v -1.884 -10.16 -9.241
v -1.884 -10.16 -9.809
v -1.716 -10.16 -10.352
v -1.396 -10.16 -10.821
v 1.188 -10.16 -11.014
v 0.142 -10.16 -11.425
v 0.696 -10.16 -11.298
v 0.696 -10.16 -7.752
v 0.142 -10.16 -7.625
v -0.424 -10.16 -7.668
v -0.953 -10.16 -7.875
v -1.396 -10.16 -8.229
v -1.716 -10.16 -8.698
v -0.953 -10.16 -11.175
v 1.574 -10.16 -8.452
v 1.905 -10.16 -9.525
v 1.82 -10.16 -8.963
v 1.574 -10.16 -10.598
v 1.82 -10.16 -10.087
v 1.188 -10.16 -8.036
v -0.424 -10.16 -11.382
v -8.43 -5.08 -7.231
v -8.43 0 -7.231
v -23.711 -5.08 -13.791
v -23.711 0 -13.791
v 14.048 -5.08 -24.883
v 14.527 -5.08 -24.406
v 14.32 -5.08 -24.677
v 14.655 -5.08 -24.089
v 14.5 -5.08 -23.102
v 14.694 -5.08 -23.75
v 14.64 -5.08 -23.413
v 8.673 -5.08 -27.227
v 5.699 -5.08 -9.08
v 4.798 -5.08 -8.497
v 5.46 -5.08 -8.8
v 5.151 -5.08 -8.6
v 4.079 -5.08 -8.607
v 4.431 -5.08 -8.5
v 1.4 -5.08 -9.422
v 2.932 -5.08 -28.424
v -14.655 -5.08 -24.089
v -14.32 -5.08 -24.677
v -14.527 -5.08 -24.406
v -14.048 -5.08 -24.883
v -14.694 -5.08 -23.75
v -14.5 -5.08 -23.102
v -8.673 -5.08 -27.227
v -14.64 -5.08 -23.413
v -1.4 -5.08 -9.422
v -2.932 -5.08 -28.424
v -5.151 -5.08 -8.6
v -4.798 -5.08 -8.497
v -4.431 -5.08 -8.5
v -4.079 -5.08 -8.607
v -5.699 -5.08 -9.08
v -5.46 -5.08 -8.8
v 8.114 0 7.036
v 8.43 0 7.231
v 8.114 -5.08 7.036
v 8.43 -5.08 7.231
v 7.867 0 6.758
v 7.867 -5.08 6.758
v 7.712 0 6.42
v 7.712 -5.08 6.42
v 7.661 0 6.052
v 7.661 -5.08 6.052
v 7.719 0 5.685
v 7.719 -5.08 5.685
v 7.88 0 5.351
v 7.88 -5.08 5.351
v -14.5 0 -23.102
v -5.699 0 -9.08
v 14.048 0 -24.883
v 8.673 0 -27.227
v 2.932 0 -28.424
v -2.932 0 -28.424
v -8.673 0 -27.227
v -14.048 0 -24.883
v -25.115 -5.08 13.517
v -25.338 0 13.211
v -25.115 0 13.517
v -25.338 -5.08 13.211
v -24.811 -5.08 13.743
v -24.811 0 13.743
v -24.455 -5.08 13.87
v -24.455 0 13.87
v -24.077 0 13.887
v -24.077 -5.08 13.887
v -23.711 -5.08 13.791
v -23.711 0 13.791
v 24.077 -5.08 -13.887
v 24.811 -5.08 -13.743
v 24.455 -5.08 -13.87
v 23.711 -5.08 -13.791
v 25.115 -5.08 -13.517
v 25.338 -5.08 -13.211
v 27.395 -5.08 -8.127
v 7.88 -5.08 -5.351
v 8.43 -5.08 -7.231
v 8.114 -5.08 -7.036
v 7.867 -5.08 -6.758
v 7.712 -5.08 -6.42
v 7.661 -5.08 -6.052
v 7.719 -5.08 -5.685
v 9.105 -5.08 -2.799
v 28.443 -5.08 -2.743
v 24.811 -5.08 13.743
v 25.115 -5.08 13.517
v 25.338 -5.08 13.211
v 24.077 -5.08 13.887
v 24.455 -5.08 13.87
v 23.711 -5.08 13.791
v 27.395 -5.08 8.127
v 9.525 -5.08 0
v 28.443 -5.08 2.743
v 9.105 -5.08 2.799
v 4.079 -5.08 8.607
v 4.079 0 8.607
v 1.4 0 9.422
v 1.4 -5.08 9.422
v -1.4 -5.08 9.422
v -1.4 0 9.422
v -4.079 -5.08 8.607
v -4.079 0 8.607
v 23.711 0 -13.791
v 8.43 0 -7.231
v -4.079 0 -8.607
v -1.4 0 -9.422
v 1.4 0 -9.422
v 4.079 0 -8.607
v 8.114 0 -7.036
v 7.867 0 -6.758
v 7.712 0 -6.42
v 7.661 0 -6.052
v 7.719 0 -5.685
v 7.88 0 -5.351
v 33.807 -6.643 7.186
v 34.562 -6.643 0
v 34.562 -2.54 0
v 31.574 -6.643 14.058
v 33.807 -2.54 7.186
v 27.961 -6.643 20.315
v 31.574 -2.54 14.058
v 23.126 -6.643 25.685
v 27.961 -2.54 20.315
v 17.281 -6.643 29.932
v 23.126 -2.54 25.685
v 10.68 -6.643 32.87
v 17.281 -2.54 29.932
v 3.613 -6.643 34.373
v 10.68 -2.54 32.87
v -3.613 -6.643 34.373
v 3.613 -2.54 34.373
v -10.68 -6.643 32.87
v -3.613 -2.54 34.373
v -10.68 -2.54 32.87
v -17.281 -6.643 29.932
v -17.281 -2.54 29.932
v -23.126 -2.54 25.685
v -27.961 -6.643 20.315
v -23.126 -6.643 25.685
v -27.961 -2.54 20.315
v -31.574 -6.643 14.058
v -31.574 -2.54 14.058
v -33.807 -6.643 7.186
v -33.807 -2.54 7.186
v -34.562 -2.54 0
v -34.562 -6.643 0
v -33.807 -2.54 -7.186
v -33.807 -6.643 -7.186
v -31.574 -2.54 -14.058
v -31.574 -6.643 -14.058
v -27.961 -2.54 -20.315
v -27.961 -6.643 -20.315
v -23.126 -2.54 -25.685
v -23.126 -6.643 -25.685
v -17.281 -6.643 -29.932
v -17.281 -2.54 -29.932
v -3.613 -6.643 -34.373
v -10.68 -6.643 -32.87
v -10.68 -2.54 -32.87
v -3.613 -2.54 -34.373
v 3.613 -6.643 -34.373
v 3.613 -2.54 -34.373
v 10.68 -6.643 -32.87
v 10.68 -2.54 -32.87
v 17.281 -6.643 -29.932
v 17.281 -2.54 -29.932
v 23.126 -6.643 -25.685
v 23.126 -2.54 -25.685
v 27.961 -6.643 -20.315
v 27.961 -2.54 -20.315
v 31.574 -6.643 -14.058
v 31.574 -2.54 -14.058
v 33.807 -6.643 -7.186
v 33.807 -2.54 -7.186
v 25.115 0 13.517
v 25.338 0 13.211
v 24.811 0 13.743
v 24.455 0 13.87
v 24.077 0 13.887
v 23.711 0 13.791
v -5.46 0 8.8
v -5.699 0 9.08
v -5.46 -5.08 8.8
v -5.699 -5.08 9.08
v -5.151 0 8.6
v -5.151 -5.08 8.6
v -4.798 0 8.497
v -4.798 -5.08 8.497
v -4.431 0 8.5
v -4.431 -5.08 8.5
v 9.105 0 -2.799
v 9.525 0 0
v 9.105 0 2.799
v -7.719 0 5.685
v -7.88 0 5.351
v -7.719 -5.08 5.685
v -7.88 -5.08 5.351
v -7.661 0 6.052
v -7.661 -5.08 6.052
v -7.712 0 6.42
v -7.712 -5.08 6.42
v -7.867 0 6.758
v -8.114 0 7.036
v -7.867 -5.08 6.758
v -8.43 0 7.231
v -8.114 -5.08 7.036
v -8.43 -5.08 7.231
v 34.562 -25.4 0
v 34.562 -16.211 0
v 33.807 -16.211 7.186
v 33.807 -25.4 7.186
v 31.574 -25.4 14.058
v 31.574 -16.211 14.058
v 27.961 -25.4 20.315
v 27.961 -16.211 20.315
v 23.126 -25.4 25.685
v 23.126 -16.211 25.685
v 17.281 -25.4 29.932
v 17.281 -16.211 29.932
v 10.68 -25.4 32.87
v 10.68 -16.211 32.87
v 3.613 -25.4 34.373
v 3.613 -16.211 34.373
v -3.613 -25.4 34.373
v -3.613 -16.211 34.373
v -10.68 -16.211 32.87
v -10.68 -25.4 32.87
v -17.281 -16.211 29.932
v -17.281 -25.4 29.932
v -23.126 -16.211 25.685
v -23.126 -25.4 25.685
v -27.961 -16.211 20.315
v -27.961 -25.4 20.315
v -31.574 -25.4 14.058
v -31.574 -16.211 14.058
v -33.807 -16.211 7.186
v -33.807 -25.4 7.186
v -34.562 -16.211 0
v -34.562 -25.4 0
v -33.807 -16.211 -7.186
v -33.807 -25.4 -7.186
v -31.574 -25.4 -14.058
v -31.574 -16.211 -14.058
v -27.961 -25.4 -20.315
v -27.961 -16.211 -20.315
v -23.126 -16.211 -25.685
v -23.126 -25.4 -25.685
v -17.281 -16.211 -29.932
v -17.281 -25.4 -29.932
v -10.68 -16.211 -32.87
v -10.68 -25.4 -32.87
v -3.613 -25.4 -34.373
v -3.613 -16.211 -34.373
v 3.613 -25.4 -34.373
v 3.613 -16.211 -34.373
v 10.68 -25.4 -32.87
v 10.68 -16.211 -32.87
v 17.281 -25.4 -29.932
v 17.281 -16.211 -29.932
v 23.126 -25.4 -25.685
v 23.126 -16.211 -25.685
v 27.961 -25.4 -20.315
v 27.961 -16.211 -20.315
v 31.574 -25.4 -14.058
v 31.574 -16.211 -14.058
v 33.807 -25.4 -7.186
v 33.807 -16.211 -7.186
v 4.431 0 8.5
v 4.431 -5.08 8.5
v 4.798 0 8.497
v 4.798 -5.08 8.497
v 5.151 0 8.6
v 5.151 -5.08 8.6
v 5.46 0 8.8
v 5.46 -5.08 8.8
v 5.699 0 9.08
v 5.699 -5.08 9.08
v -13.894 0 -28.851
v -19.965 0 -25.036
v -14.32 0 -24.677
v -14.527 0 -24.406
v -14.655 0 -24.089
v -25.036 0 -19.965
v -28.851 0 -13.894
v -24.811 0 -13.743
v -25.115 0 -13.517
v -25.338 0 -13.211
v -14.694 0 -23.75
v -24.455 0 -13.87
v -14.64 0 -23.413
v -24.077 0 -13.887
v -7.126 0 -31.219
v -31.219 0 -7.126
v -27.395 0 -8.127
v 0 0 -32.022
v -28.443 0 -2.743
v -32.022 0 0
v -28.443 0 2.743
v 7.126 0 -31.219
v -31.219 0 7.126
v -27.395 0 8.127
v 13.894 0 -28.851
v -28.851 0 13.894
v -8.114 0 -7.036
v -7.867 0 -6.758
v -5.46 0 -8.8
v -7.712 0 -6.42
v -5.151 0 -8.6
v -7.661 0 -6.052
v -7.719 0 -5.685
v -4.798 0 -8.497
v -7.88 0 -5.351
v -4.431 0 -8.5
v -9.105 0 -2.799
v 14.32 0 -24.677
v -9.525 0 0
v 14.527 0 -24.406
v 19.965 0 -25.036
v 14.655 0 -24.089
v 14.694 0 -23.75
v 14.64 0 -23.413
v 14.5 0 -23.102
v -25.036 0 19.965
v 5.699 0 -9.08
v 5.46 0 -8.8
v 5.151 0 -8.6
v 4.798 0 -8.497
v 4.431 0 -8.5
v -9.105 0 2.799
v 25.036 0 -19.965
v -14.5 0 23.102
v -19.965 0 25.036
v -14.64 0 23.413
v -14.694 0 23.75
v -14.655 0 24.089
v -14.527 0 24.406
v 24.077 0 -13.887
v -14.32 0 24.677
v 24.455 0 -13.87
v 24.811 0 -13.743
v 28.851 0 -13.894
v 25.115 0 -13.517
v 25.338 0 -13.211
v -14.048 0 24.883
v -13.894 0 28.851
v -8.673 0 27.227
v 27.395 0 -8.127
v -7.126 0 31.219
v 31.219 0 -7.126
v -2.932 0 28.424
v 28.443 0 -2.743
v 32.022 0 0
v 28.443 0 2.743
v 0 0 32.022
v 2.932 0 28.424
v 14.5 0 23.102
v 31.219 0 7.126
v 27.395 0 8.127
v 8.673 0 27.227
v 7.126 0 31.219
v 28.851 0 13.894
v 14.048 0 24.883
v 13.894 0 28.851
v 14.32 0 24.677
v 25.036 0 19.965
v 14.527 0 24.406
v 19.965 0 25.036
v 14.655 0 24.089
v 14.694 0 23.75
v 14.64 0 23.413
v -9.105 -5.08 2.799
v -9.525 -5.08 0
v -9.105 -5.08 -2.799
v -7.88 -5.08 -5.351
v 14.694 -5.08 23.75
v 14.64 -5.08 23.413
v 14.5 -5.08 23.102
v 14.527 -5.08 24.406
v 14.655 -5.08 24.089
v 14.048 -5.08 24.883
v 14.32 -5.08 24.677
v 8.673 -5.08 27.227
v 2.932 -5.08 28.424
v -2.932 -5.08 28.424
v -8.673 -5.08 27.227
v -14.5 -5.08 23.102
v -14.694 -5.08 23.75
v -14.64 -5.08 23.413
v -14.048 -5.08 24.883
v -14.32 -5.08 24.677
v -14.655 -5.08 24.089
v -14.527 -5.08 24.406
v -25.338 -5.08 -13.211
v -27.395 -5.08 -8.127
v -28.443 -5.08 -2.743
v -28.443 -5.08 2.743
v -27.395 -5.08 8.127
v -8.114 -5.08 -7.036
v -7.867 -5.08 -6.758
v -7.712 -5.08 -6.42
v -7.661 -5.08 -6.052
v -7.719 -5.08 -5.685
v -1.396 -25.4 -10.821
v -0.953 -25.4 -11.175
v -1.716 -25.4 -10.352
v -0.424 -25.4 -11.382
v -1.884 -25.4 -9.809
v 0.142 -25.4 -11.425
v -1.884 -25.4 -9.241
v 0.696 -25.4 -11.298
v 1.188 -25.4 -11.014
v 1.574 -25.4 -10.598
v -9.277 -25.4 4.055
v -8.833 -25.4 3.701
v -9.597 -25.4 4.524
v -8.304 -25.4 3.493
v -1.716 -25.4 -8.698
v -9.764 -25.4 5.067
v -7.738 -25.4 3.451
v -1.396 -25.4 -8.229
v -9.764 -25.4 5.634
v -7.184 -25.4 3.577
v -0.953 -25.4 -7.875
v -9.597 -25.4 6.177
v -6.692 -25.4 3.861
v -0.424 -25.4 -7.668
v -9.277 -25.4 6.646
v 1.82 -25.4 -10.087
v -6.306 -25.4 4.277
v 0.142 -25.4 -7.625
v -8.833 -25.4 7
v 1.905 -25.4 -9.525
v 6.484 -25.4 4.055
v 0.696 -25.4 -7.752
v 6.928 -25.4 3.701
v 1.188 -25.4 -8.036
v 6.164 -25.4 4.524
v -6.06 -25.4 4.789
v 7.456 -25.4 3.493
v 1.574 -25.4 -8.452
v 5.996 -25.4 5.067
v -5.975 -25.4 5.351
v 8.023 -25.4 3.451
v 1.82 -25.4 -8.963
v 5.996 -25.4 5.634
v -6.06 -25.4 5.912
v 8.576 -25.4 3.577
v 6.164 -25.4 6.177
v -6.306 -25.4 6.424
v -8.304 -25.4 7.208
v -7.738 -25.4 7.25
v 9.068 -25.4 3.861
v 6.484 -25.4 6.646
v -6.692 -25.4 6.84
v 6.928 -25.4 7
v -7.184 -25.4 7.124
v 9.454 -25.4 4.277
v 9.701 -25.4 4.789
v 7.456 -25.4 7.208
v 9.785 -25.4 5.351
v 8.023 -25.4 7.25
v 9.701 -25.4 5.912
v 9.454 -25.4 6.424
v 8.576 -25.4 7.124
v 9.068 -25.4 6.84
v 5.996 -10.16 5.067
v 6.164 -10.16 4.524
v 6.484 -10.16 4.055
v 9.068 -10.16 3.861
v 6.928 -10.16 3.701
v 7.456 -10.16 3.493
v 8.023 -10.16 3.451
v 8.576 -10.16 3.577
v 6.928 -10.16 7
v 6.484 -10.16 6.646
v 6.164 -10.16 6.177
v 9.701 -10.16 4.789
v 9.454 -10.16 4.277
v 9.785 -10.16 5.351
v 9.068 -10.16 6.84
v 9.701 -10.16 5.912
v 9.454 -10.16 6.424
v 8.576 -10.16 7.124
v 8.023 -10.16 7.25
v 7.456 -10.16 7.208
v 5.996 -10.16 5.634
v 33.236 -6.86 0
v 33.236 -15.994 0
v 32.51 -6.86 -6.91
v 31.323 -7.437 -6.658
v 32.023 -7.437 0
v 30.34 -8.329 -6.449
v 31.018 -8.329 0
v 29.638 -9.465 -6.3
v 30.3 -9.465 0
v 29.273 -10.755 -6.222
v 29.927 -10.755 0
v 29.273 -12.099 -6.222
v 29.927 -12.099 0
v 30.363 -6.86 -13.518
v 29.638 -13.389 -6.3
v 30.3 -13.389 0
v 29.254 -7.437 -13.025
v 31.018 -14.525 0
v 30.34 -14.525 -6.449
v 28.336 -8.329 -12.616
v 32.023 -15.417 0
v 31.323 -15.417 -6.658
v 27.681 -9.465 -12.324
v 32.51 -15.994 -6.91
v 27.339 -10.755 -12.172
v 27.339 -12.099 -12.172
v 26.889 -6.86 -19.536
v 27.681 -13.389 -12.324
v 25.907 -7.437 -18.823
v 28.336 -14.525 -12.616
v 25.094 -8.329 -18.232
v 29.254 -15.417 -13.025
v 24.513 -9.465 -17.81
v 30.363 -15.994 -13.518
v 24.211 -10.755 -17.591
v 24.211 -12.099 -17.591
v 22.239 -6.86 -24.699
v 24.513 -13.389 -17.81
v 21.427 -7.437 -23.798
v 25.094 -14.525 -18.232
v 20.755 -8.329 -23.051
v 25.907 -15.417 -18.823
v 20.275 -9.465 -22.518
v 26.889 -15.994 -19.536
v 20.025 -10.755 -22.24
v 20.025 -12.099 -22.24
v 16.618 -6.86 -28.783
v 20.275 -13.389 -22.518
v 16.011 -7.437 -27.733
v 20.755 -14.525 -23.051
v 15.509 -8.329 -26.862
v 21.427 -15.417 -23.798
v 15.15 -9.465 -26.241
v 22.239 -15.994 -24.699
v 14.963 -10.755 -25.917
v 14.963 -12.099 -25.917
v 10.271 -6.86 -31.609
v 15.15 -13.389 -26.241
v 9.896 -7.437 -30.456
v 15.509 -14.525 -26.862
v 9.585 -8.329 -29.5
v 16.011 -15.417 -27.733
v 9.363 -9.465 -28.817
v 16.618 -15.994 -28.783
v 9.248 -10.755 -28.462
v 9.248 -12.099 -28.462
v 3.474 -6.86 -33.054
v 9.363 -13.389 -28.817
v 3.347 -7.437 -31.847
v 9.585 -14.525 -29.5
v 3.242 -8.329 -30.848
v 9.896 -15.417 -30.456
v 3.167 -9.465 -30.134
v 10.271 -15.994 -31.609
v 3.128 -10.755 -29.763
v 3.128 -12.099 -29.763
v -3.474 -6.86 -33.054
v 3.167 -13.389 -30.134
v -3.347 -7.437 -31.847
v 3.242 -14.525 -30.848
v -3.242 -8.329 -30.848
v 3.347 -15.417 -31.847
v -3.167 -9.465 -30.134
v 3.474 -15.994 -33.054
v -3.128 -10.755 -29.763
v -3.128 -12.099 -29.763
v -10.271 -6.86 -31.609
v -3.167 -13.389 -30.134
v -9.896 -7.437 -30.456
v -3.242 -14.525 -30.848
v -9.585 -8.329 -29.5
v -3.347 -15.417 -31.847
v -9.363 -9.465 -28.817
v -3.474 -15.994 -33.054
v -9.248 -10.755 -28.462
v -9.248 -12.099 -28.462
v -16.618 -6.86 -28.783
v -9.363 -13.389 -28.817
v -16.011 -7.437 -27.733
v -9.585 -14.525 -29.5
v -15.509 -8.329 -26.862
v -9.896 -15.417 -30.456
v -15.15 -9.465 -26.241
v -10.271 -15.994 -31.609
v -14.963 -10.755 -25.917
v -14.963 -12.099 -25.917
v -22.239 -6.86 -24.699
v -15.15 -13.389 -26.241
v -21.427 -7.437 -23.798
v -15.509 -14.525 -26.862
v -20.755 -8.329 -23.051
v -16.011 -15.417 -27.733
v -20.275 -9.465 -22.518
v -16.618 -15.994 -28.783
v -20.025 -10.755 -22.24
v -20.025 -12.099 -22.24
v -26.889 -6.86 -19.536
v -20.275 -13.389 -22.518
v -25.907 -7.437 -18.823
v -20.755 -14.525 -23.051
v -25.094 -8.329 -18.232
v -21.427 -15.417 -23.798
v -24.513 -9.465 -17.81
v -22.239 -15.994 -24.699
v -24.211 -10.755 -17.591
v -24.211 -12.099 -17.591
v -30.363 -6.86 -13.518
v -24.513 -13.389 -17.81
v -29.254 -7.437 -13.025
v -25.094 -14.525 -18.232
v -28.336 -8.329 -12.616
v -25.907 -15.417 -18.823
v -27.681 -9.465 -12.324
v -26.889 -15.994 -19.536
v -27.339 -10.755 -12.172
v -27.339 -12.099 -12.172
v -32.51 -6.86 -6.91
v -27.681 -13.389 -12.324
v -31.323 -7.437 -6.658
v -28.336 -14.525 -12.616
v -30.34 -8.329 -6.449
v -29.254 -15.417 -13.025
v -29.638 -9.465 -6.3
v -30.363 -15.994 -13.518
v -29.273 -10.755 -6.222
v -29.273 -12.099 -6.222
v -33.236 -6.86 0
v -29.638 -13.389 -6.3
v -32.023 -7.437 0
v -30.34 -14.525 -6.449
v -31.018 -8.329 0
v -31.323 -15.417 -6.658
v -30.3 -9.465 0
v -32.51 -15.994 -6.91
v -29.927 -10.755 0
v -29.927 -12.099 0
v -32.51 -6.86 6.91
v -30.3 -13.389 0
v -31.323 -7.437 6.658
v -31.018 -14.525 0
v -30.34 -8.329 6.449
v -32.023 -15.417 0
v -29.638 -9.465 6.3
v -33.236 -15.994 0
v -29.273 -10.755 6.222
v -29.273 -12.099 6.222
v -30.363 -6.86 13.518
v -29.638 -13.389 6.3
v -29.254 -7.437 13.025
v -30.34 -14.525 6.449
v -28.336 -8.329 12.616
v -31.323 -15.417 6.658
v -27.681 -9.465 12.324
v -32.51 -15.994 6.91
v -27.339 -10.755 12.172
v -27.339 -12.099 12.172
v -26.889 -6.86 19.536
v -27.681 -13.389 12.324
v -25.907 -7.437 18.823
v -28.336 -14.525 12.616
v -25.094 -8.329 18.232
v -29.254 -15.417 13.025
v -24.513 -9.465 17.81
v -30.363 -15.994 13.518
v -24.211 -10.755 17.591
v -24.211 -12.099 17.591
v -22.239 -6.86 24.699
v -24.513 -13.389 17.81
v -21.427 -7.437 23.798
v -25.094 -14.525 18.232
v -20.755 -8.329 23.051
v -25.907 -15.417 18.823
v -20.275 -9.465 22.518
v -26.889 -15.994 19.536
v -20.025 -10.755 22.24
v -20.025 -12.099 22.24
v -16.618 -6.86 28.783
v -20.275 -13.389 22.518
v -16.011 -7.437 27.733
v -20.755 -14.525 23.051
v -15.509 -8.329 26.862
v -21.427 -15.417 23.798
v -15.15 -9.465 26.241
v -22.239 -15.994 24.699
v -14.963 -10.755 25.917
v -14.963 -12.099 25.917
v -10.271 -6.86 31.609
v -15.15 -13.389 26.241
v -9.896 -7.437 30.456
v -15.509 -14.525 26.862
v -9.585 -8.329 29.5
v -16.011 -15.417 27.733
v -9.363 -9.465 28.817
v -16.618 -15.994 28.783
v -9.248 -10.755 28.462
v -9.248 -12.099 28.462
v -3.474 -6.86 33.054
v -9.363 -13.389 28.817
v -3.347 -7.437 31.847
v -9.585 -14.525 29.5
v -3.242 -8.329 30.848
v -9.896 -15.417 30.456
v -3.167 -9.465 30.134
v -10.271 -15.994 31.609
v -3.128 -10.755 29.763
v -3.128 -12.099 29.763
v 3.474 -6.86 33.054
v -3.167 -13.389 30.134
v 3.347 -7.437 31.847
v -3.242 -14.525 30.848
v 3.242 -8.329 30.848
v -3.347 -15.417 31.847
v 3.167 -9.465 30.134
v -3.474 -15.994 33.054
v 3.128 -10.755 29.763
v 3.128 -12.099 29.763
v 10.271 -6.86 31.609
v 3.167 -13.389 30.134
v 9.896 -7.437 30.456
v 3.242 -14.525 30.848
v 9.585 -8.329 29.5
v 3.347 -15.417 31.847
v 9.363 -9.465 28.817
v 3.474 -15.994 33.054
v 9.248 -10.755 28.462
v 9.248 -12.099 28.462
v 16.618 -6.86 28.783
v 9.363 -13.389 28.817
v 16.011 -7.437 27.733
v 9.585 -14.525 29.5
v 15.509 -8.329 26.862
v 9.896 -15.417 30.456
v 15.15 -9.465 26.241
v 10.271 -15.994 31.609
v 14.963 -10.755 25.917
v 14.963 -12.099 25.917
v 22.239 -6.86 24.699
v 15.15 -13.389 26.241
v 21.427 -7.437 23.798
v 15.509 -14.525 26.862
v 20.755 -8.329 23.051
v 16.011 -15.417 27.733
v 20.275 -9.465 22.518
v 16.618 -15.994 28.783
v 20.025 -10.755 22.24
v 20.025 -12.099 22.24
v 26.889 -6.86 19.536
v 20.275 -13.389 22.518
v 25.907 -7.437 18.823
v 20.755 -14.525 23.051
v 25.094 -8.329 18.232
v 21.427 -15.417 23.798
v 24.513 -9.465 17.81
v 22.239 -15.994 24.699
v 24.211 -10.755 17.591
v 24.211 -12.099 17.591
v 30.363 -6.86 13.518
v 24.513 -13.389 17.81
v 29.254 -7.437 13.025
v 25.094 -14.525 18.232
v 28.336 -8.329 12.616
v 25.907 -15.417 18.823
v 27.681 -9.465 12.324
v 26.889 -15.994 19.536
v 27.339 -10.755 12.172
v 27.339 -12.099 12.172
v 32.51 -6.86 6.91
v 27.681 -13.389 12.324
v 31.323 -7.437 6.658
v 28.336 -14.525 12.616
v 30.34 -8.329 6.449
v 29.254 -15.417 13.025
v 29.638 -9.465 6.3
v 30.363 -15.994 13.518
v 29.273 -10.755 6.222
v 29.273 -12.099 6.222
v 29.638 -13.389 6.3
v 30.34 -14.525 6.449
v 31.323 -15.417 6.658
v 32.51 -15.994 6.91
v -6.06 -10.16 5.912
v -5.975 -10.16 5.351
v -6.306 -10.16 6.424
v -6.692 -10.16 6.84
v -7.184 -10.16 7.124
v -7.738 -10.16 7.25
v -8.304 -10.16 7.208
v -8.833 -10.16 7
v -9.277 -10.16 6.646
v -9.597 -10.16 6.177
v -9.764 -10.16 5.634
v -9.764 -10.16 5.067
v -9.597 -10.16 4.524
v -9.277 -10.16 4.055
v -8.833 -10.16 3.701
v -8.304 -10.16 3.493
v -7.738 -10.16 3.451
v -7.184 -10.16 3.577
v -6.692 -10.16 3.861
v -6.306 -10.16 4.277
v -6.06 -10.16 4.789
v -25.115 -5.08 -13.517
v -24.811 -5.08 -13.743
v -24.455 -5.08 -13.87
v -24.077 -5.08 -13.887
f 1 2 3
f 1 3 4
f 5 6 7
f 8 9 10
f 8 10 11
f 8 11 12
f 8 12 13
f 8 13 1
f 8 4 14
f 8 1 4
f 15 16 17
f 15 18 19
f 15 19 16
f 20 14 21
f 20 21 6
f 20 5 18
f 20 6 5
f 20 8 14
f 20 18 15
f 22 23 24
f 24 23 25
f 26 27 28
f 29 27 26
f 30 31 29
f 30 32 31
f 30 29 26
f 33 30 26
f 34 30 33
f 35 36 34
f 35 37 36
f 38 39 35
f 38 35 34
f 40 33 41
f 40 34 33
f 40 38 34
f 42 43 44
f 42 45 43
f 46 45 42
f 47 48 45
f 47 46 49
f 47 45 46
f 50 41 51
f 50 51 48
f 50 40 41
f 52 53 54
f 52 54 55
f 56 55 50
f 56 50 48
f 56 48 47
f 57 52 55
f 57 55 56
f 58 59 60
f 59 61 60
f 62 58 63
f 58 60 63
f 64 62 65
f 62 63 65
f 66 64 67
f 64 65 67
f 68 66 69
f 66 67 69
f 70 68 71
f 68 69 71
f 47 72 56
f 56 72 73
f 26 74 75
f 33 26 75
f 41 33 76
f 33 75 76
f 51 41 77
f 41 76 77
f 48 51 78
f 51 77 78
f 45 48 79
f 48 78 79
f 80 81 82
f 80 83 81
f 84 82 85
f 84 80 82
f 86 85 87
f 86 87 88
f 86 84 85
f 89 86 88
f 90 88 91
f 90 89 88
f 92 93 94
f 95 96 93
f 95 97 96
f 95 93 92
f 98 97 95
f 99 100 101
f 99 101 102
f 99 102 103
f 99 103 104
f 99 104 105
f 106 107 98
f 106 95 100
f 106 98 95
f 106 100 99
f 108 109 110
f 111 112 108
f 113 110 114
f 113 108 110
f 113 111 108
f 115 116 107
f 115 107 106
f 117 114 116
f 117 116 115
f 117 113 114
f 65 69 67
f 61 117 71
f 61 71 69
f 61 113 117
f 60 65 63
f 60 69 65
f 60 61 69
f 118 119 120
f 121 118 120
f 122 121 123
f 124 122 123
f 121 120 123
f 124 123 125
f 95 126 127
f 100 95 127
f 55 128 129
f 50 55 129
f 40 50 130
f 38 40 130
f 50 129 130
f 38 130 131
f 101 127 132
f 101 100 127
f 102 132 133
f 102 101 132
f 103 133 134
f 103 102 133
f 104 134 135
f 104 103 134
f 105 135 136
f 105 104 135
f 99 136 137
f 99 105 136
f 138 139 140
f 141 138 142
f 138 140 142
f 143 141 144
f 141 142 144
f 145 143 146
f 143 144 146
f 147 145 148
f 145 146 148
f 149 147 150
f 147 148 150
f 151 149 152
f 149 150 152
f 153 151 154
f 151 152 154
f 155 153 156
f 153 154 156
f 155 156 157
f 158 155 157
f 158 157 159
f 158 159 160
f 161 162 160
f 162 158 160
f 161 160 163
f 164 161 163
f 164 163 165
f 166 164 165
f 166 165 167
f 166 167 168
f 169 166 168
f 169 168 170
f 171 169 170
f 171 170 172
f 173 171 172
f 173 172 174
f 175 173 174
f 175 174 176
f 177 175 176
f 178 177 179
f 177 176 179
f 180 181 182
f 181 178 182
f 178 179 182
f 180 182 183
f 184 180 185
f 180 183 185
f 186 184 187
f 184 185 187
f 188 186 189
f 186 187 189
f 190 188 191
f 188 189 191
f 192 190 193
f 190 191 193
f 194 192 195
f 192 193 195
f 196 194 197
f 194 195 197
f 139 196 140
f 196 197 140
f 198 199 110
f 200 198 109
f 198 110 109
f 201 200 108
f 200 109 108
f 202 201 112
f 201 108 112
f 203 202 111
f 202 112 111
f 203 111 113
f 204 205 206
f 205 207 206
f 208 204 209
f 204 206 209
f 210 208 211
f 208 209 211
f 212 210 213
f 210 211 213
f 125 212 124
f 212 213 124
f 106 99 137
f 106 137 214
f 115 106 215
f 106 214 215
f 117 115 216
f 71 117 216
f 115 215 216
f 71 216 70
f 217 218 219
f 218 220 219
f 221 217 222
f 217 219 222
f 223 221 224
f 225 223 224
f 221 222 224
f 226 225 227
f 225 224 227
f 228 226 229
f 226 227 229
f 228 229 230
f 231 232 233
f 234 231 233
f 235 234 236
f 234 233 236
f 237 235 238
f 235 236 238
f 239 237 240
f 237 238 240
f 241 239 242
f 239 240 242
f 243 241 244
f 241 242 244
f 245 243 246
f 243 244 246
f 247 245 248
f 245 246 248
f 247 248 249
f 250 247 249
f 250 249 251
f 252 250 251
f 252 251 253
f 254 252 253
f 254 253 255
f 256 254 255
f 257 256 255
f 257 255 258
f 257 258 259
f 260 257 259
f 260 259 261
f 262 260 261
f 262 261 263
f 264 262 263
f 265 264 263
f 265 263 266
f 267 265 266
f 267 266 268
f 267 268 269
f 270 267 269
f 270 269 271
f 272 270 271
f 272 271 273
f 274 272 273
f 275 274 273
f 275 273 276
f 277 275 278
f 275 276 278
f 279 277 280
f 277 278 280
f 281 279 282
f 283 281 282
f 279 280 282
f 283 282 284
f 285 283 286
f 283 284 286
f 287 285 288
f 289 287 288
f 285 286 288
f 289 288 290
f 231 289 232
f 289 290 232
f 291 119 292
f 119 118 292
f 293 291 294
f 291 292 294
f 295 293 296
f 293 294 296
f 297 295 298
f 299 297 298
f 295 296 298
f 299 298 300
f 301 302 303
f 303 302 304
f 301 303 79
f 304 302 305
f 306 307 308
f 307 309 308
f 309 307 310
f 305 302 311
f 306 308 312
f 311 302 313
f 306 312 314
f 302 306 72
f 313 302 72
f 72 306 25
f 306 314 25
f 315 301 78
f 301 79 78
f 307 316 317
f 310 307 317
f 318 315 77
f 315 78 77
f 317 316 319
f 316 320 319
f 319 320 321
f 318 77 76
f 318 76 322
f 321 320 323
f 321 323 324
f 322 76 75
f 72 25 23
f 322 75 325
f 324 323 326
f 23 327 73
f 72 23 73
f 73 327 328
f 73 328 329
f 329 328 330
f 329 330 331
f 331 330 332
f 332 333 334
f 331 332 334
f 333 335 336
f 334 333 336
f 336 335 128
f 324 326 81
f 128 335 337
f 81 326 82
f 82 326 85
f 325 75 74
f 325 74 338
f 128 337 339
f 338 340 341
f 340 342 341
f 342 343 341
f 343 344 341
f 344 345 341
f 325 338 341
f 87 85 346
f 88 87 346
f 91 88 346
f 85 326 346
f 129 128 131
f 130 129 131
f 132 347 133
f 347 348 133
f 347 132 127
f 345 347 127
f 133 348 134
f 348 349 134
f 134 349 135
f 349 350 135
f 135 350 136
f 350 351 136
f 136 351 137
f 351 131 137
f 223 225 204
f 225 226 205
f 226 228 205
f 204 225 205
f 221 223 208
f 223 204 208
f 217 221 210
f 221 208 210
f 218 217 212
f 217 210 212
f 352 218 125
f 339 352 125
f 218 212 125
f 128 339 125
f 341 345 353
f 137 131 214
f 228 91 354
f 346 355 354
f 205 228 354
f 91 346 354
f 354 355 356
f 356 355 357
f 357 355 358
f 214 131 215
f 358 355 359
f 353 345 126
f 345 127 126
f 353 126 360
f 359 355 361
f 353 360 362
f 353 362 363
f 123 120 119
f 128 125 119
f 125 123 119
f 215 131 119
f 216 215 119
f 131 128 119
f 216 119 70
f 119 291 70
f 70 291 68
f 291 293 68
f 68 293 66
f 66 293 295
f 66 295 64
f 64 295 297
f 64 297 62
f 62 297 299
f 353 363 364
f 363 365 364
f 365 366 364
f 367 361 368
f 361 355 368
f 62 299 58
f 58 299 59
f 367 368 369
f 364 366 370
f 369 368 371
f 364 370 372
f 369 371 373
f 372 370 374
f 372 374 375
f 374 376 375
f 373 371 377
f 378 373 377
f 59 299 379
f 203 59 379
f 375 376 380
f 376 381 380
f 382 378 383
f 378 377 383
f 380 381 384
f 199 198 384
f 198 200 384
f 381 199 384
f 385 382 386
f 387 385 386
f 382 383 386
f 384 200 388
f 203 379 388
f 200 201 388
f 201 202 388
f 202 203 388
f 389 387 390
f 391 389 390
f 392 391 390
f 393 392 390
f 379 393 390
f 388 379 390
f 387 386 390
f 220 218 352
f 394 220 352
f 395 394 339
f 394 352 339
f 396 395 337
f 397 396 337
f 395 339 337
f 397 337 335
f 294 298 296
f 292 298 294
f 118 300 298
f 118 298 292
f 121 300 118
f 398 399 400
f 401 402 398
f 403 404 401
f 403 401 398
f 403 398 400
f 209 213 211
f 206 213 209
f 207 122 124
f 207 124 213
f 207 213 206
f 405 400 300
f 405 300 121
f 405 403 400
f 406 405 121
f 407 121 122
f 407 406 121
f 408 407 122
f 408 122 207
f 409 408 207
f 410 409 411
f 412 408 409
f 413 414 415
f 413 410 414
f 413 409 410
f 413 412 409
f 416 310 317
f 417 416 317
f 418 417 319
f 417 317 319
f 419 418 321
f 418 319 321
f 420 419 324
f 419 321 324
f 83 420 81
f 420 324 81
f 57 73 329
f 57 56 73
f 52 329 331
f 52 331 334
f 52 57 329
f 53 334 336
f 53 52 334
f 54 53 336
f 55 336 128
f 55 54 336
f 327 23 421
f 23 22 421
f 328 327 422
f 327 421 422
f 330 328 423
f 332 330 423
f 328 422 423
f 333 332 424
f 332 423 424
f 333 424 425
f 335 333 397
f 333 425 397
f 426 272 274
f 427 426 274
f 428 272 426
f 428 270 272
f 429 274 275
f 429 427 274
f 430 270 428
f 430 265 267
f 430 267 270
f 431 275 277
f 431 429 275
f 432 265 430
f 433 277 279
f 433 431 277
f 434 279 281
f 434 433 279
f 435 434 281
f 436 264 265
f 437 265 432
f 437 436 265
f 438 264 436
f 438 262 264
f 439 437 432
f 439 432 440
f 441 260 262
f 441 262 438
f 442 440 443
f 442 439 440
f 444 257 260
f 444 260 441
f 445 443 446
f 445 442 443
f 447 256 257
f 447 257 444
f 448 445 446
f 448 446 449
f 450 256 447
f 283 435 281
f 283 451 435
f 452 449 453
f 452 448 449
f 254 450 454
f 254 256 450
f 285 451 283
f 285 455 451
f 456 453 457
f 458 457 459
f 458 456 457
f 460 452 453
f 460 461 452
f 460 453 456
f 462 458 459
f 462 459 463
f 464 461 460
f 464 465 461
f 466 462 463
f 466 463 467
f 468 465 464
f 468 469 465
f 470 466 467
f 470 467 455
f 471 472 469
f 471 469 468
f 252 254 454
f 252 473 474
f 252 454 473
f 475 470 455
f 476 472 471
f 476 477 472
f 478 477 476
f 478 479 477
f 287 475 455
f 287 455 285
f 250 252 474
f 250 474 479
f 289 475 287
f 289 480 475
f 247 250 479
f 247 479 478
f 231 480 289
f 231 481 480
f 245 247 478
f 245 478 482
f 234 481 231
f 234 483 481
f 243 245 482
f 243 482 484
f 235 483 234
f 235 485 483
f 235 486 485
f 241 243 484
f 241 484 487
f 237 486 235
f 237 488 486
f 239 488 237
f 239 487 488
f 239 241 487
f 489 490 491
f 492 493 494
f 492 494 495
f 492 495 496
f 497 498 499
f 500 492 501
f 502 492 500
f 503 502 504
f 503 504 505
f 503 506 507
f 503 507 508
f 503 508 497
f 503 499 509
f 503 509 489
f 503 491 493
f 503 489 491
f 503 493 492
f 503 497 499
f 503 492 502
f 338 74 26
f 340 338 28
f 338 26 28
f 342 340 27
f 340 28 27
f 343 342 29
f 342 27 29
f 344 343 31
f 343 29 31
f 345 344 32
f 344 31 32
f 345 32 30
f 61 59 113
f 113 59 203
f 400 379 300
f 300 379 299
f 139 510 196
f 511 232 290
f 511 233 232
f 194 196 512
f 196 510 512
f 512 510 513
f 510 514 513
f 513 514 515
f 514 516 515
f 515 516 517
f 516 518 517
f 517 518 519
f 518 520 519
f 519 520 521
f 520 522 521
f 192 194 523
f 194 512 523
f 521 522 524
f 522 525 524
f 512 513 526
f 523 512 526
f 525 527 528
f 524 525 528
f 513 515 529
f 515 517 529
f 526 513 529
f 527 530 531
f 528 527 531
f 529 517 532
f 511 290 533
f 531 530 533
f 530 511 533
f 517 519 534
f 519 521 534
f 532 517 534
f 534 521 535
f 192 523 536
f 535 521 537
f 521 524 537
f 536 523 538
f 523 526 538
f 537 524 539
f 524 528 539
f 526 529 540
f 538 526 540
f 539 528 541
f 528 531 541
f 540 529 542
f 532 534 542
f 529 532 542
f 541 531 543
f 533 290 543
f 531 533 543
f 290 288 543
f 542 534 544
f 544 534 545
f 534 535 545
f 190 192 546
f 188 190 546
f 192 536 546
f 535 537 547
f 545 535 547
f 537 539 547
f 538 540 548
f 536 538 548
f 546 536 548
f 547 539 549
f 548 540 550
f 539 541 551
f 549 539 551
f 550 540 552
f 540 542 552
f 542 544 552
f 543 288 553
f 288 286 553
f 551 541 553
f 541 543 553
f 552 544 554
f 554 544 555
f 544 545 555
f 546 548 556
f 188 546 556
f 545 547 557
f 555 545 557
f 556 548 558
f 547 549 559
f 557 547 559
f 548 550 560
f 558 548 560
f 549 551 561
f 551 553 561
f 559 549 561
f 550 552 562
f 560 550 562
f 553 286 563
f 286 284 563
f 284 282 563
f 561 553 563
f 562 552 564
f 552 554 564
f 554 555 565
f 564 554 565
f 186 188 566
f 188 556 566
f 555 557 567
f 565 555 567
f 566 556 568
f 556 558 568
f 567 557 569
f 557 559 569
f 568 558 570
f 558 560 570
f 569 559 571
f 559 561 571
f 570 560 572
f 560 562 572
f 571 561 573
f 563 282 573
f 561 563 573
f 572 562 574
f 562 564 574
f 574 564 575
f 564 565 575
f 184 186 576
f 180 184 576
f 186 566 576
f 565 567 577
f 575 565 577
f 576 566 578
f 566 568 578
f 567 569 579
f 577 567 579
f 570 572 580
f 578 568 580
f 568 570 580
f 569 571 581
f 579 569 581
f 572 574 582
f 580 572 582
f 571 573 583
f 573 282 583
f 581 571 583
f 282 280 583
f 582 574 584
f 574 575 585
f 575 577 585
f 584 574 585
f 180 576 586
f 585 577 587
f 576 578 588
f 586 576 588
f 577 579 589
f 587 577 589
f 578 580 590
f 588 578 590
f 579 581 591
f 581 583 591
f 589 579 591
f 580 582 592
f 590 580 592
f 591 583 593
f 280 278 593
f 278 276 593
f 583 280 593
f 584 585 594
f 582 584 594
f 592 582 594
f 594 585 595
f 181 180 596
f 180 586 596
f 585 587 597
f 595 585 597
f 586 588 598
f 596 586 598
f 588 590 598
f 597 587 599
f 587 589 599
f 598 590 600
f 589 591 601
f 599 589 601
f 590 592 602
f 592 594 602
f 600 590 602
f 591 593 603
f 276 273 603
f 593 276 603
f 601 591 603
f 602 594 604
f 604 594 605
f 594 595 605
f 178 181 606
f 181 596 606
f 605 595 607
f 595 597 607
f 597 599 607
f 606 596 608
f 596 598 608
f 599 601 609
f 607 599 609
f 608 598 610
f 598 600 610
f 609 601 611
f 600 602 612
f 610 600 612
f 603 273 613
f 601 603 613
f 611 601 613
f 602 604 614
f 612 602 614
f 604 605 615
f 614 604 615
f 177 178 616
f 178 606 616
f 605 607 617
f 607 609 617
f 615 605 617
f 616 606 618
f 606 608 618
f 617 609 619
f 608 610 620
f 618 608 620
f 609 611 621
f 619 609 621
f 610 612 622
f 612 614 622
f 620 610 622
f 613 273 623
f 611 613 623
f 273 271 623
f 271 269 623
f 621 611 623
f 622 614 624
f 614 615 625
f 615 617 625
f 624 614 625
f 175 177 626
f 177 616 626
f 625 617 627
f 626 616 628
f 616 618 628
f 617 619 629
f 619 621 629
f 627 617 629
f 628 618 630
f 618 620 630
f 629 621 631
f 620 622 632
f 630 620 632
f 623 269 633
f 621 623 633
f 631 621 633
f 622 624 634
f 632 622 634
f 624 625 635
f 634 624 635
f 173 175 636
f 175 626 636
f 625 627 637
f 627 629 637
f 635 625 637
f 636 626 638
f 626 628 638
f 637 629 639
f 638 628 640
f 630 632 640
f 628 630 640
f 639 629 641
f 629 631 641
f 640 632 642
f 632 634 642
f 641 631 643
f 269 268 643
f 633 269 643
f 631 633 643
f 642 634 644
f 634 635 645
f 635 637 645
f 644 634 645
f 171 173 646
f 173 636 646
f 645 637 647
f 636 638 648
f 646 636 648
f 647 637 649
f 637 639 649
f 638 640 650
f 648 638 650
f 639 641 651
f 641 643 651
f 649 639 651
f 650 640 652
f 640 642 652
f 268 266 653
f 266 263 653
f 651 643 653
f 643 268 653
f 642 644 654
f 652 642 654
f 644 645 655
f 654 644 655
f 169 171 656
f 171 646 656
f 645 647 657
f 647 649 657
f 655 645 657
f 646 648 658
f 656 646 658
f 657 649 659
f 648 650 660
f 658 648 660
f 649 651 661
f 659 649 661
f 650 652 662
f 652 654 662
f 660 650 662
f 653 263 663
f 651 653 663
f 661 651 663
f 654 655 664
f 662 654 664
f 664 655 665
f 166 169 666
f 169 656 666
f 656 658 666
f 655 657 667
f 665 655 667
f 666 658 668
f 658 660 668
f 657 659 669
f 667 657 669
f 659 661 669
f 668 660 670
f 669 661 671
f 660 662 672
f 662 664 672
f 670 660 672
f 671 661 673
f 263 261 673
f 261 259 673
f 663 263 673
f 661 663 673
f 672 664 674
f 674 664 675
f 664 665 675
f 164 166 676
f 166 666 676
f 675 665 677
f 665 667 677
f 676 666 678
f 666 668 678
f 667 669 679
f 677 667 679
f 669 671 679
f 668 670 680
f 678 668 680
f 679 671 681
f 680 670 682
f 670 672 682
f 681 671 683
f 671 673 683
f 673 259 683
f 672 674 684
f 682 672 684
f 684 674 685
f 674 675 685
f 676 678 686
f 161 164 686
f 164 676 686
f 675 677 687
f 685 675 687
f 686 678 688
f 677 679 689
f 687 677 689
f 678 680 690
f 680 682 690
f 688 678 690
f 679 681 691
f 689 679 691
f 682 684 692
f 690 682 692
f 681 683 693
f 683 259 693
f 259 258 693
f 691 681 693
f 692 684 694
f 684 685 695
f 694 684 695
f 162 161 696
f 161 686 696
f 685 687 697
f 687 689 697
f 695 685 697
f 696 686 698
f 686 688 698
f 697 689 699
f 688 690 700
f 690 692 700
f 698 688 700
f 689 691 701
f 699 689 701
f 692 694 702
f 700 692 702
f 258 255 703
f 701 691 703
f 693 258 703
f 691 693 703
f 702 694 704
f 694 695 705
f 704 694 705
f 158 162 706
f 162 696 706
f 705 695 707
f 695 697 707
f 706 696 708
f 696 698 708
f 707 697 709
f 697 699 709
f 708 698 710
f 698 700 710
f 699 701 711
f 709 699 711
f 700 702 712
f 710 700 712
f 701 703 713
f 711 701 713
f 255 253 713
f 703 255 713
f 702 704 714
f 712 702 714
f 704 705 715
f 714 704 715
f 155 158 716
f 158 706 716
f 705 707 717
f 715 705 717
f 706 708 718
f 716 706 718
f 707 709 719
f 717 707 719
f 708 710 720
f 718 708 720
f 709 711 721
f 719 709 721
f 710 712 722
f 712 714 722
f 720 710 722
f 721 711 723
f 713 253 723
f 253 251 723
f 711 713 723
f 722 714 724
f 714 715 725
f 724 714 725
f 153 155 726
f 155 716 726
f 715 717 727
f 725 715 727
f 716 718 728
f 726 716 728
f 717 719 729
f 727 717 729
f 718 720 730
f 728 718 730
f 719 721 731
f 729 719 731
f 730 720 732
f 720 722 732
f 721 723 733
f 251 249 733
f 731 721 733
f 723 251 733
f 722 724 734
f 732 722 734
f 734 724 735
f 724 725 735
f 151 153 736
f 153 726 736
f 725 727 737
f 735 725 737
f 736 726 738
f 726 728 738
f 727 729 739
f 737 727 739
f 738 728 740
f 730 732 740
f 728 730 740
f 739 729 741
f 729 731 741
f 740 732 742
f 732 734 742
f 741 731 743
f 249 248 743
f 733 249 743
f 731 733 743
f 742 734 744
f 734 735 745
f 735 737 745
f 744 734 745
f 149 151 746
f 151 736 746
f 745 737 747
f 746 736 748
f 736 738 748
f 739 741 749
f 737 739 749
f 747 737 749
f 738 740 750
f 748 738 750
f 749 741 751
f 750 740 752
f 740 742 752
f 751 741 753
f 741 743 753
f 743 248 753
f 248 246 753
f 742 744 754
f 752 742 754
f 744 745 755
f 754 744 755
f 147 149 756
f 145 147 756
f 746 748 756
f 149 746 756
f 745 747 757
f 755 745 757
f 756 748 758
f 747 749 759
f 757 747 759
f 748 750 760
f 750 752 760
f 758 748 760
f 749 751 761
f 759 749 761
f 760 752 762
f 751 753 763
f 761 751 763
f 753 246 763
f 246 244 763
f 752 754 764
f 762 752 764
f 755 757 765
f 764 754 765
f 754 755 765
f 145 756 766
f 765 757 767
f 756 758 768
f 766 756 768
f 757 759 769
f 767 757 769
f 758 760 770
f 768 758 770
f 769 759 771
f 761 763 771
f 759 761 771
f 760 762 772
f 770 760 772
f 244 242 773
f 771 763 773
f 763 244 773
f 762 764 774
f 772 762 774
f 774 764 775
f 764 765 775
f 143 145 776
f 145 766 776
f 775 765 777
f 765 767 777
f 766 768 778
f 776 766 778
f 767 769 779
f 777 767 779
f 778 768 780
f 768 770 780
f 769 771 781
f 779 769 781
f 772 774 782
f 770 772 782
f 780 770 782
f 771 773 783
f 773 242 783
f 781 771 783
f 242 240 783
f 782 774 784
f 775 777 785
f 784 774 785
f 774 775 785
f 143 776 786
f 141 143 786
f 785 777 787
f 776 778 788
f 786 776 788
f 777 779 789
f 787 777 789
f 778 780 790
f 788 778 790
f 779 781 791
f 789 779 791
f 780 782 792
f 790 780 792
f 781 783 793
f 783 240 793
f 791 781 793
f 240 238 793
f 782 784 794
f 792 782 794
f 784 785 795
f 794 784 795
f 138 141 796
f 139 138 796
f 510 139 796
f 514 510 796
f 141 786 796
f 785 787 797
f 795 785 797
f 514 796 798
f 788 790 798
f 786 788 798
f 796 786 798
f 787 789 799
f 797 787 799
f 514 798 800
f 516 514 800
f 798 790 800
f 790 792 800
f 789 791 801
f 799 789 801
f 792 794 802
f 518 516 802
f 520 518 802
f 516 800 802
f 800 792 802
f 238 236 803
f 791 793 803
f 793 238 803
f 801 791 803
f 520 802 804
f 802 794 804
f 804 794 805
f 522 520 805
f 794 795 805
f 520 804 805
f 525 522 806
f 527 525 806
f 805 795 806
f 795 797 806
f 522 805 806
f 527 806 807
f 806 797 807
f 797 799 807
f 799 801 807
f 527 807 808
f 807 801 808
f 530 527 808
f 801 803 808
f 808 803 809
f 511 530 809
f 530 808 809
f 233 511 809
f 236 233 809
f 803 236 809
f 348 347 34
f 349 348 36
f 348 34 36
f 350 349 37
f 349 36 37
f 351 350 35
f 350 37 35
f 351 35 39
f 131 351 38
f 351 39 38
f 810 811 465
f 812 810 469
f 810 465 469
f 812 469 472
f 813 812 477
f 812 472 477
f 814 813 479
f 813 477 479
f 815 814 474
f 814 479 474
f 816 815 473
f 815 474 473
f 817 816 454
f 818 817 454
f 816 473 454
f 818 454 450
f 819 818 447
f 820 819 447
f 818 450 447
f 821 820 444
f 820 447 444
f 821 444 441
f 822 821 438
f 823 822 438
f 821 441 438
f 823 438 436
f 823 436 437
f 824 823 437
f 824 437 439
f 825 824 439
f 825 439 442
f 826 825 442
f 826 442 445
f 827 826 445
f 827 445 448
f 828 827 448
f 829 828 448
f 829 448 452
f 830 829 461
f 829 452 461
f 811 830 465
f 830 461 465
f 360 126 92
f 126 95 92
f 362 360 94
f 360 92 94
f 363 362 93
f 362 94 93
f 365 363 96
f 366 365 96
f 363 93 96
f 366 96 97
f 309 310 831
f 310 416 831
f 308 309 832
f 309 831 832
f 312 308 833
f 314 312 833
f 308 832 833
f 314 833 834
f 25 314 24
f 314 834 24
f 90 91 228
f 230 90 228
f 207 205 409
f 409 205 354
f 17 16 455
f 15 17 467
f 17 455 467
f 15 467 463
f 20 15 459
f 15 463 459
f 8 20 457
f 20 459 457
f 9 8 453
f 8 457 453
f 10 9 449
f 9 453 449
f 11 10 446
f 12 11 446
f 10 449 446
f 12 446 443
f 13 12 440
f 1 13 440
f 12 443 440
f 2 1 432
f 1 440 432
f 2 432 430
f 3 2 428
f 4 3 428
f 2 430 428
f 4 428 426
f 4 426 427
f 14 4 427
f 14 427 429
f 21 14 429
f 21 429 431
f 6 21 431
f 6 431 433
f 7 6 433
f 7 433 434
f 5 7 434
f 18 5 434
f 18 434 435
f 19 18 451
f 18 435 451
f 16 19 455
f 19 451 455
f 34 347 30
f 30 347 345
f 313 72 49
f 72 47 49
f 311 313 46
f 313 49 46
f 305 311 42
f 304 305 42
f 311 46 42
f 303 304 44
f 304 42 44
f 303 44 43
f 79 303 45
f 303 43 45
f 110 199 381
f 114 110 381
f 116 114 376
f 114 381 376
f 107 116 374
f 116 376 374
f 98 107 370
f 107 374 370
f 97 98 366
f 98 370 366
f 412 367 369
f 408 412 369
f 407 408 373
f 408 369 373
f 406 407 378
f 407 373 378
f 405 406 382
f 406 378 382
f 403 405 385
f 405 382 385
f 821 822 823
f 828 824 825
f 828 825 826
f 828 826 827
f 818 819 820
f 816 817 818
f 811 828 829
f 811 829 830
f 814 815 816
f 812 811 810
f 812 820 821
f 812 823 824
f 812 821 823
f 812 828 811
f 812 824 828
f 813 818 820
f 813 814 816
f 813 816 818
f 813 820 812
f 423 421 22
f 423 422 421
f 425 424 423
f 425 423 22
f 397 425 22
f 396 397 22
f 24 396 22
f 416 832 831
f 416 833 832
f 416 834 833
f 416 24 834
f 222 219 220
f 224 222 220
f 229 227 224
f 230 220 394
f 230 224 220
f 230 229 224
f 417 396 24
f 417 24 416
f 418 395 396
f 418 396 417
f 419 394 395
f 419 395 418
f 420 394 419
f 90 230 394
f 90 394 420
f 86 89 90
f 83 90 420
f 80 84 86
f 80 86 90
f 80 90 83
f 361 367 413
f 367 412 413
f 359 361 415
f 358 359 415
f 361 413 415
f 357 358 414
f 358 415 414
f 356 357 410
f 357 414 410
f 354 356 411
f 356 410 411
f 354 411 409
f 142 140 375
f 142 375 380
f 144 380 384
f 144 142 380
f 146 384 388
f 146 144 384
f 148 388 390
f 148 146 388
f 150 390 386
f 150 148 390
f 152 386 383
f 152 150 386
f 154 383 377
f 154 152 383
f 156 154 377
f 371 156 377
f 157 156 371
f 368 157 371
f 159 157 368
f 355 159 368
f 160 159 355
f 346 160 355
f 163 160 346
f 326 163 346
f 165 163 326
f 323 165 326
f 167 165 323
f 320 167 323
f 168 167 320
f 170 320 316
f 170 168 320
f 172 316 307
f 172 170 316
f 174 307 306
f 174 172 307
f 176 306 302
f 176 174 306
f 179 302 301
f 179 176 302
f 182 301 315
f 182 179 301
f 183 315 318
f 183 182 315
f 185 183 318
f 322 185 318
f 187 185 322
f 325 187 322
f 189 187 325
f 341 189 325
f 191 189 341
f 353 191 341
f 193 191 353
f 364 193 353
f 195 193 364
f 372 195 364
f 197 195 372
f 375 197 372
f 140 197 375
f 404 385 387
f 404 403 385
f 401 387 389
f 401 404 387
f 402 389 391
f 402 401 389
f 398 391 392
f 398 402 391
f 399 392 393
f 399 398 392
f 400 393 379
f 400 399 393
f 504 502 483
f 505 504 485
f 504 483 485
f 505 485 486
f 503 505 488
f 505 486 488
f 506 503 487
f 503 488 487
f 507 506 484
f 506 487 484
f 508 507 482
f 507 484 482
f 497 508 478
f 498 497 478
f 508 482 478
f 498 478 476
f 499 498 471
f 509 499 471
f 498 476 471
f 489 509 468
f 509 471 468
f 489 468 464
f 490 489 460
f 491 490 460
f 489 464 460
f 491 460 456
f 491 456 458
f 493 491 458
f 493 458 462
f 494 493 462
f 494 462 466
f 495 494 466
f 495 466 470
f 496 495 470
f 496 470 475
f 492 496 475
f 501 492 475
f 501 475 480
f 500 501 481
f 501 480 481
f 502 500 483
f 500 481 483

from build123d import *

# Parameters (mm, degrees)
F0_R     = 34.561988
F1_DEPTH = 25.4
F3_DEPTH = 5.08
F4_R     = 1.27
F5_R     = 4.785324
F7_SIZE  = 2.54
F8_R     = 1.905
F9_DEPTH = 15.24


with BuildPart() as f1:
    # F0 (on Front) → F1 (new body)
    with BuildSketch(Plane.XZ):
        Circle(F0_R)
        with BuildLine():
            ThreePointArc((16.74505, -23.154566), (0, -28.575), (-16.74505, -23.154566))
            Line((-16.74505, -23.154566), (-5.581683, -7.718189))
            ThreePointArc((-5.581683, -7.718189), (0, -9.525), (5.581683, -7.718189))
            Line((5.581683, -7.718189), (16.74505, -23.154566))
        make_face(mode=Mode.SUBTRACT)
        with BuildLine():
            Line((-25.330056, 13.22569), (-7.497648, 5.874598))
            ThreePointArc((-7.497648, 5.874598), (-9.525, 0), (-7.497648, -5.874598))
            Line((-7.497648, -5.874598), (-25.330056, -13.22569))
            ThreePointArc((-25.330056, -13.22569), (-28.575, 0), (-25.330056, 13.22569))
        make_face(mode=Mode.SUBTRACT)
        with BuildLine():
            ThreePointArc((7.497648, -5.874598), (9.525, 0), (7.497648, 5.874598))
            Line((7.497648, 5.874598), (25.330056, 13.22569))
            ThreePointArc((25.330056, 13.22569), (28.575, 0), (25.330056, -13.22569))
            Line((25.330056, -13.22569), (7.497648, -5.874598))
        make_face(mode=Mode.SUBTRACT)
        with BuildLine():
            Line((-5.581683, 7.718189), (-16.74505, 23.154566))
            ThreePointArc((-16.74505, 23.154566), (0, 28.575), (16.74505, 23.154566))
            Line((16.74505, 23.154566), (5.581683, 7.718189))
            ThreePointArc((5.581683, 7.718189), (0, 9.525), (-5.581683, 7.718189))
        make_face(mode=Mode.SUBTRACT)
        with BuildLine():
            Line((25.330056, 13.22569), (7.497648, 5.874598))
            ThreePointArc((7.497648, 5.874598), (9.525, 0), (7.497648, -5.874598))
            Line((7.497648, -5.874598), (25.330056, -13.22569))
            ThreePointArc((25.330056, -13.22569), (28.575, 0), (25.330056, 13.22569))
        make_face()
        with BuildLine():
            ThreePointArc((16.74505, 23.154566), (0, 28.575), (-16.74505, 23.154566))
            Line((-16.74505, 23.154566), (-5.581683, 7.718189))
            ThreePointArc((-5.581683, 7.718189), (0, 9.525), (5.581683, 7.718189))
            Line((5.581683, 7.718189), (16.74505, 23.154566))
        make_face()
        with BuildLine():
            ThreePointArc((-7.497648, -5.874598), (-9.525, 0), (-7.497648, 5.874598))
            Line((-7.497648, 5.874598), (-25.330056, 13.22569))
            ThreePointArc((-25.330056, 13.22569), (-28.575, 0), (-25.330056, -13.22569))
            Line((-25.330056, -13.22569), (-7.497648, -5.874598))
        make_face()
        with BuildLine():
            Line((-5.581683, -7.718189), (-16.74505, -23.154566))
            ThreePointArc((-16.74505, -23.154566), (0, -28.575), (16.74505, -23.154566))
            Line((16.74505, -23.154566), (5.581683, -7.718189))
            ThreePointArc((5.581683, -7.718189), (0, -9.525), (-5.581683, -7.718189))
        make_face()
    extrude(amount=F1_DEPTH)

    # F2 (on face) → F3 (cut)
    with BuildSketch(Plane(origin=(0, 0, 0), x_dir=(-1, 0, 0), z_dir=(0, 1, 0))):
        with BuildLine():
            ThreePointArc((-6.894682, -6.571833), (-9.525, 0), (-6.894682, 6.571833))
            Line((-6.894682, 6.571833), (-24.770568, 14.246038))
            ThreePointArc((-24.770568, 14.246038), (-28.575, 0), (-24.770568, -14.246038))
            Line((-24.770568, -14.246038), (-6.894682, -6.571833))
        make_face()
        with BuildLine():
            Line((-15.190351, 24.202972), (-5.06345, 8.067657))
            ThreePointArc((-5.06345, 8.067657), (0, 9.525), (5.06345, 8.067657))
            Line((5.06345, 8.067657), (15.190351, 24.202972))
            ThreePointArc((15.190351, 24.202972), (0, 28.575), (-15.190351, 24.202972))
        make_face()
        with BuildLine():
            Line((24.770568, 14.246038), (6.894682, 6.571833))
            ThreePointArc((6.894682, 6.571833), (9.525, 0), (6.894682, -6.571833))
            Line((6.894682, -6.571833), (24.770568, -14.246038))
            ThreePointArc((24.770568, -14.246038), (28.575, 0), (24.770568, 14.246038))
        make_face()
        with BuildLine():
            ThreePointArc((5.06345, -8.067657), (0, -9.525), (-5.06345, -8.067657))
            Line((-5.06345, -8.067657), (-15.190351, -24.202972))
            ThreePointArc((-15.190351, -24.202972), (0, -28.575), (15.190351, -24.202972))
            Line((15.190351, -24.202972), (5.06345, -8.067657))
        make_face()
    extrude(amount=-F3_DEPTH, mode=Mode.SUBTRACT)

    # F4
    f4_edges = [f1.edges().sort_by_distance(p)[0] for p in [
        (24.770568, -2.54, 14.246038),
        (24.770568, -2.54, -14.246038),
        (6.894682, -2.54, -6.571833),
        (6.894682, -2.54, 6.571833),
        (5.06345, -2.54, 8.067657),
        (15.190351, -2.54, 24.202972),
        (-15.190351, -2.54, 24.202972),
        (-5.06345, -2.54, 8.067657),
        (-6.894682, -2.54, 6.571833),
        (-6.894682, -2.54, -6.571833),
        (-24.770568, -2.54, -14.246038),
        (-24.770568, -2.54, 14.246038),
        (-5.06345, -2.54, -8.067657),
        (5.06345, -2.54, -8.067657),
        (15.190351, -2.54, -24.202972),
        (-15.190351, -2.54, -24.202972),
    ]]
    fillet(f4_edges, radius=F4_R)

    # F5 (on Top) → F6 (revolve, cut)
    with BuildSketch(Plane.XY):
        with Locations((34.664739, -11.4271)):
            Circle(F5_R)
    revolve(axis=Axis((0, 0, 0), (0, 1, 0)), mode=Mode.SUBTRACT)

    # F7
    f7_edges = [f1.edges().sort_by_distance(p)[0] for p in [
        (-34.561988, 0, 0),
    ]]
    chamfer(f7_edges, length=F7_SIZE)

    # F8 (on face) → F9 (cut)
    with BuildSketch(Plane.XZ.offset(25.4)):
        with Locations((-7.88021, 5.350506)):
            Circle(F8_R)
        with Locations((7.88021, 5.350506)):
            Circle(F8_R)
        with Locations((0, -9.525)):
            Circle(F8_R)
    extrude(amount=-F9_DEPTH, mode=Mode.SUBTRACT)


solid = f1.part
